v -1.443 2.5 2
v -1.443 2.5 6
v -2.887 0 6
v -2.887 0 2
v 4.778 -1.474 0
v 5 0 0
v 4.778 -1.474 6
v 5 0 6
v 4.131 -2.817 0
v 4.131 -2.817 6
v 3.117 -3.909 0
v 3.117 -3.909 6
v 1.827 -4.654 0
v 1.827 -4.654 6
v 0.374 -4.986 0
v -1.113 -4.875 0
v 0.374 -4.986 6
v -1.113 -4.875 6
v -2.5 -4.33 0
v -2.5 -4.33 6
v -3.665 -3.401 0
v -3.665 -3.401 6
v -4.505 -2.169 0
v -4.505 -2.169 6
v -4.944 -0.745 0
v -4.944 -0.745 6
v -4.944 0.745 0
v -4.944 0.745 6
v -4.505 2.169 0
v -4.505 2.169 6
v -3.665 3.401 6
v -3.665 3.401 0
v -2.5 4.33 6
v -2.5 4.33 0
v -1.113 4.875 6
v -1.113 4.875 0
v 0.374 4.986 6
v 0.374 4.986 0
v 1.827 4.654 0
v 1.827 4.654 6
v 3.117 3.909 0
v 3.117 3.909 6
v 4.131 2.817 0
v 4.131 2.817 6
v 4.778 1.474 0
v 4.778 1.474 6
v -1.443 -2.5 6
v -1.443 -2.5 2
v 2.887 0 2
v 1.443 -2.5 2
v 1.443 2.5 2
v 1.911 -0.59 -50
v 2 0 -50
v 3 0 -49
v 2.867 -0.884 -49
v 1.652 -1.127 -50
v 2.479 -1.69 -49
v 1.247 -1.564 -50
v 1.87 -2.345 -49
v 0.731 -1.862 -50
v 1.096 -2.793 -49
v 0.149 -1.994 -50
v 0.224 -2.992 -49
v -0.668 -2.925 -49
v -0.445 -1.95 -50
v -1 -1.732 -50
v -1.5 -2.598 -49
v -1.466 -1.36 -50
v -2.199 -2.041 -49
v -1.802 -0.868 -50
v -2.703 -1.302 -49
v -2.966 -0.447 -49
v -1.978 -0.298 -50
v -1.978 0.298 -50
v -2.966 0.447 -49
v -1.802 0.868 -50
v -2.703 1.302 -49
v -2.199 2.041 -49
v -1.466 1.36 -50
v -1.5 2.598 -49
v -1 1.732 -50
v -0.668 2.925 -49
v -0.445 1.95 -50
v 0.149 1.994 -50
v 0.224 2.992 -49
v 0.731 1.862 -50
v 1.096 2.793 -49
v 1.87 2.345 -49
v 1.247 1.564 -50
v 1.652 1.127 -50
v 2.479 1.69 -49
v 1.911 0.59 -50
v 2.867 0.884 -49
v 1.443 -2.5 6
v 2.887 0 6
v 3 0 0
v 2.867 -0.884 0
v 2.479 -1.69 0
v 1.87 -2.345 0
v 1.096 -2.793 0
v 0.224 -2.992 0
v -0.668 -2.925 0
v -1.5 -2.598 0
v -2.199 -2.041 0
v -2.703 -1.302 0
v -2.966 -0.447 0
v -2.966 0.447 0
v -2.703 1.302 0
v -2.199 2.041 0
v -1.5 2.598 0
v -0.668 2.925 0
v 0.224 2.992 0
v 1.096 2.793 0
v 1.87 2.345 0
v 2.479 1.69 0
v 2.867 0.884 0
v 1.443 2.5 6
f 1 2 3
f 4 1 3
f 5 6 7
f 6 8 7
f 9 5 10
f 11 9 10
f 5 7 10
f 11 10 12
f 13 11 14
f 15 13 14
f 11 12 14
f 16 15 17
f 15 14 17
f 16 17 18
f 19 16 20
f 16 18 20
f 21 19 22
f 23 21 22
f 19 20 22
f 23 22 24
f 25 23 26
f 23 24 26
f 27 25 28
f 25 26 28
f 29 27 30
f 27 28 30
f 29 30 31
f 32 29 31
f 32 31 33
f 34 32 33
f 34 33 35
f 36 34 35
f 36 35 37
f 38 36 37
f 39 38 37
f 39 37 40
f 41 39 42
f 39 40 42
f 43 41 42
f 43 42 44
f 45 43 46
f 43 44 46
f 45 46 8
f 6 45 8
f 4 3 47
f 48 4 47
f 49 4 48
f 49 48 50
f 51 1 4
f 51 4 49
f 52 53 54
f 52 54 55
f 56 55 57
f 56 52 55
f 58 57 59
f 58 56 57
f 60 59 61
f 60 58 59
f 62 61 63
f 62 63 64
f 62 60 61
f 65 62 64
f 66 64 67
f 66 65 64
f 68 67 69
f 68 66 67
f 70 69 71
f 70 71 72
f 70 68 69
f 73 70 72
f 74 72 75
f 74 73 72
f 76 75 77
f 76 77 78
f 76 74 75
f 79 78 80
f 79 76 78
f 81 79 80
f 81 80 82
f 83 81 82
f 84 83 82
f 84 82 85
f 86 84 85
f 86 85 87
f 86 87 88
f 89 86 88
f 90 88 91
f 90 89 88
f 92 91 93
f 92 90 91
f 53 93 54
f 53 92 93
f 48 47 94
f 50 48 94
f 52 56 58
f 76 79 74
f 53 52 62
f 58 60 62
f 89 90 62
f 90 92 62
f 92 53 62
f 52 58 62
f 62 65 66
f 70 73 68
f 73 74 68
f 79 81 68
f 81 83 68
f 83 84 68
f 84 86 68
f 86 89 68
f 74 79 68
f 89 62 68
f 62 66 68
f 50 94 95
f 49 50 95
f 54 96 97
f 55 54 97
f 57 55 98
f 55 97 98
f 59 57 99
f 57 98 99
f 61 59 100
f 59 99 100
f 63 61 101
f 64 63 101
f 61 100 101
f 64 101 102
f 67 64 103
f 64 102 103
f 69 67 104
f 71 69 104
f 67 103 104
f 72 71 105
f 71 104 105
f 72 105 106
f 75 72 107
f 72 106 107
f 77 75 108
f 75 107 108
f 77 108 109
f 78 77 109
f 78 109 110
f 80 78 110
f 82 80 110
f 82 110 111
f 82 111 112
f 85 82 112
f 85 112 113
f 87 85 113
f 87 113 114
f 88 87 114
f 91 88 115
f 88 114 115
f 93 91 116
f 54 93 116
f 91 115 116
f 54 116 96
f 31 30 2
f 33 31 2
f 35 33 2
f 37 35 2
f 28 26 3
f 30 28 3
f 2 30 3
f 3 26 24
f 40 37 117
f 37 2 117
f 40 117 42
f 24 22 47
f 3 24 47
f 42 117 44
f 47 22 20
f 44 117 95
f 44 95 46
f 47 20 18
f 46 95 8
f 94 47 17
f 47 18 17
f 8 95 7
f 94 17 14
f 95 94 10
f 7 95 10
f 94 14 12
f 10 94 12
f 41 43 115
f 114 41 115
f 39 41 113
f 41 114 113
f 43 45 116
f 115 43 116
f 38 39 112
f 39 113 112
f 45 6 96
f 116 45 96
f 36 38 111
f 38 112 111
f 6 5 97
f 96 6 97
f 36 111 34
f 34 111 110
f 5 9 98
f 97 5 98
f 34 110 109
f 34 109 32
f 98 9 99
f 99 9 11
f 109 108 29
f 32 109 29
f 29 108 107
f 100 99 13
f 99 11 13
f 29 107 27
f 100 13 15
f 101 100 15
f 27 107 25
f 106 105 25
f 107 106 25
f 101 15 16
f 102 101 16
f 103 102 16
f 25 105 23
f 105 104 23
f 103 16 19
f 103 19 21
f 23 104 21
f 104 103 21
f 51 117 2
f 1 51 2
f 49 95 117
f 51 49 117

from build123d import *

# Parameters (mm, degrees)
F3_DEPTH = 4
F4_SIZE  = 1


with BuildPart() as f1:
    # F0 (on Front) → F1 (revolve)
    with BuildSketch(Plane.XZ):
        Polygon((5, 6), (0, 6), (0, -50), (3, -50), (3, 0), (5, 0), align=None)
    revolve(axis=Axis((0, 0, -50.553678), (0, 0, -1)))

    # F2 (on face) → F3 (cut)
    with BuildSketch(Plane.XY.offset(6)):
        Polygon((1.443376, 2.5), (-1.443376, 2.5), (-2.886751, 0), (-1.443376, -2.5), (1.443376, -2.5), (2.886751, 0), align=None)
    extrude(amount=-F3_DEPTH, mode=Mode.SUBTRACT)

    # F4
    f4_edges = [f1.edges().sort_by_distance(p)[0] for p in [
        (-3, 0, -50),
    ]]
    chamfer(f4_edges, length=F4_SIZE)


solid = f1.part
